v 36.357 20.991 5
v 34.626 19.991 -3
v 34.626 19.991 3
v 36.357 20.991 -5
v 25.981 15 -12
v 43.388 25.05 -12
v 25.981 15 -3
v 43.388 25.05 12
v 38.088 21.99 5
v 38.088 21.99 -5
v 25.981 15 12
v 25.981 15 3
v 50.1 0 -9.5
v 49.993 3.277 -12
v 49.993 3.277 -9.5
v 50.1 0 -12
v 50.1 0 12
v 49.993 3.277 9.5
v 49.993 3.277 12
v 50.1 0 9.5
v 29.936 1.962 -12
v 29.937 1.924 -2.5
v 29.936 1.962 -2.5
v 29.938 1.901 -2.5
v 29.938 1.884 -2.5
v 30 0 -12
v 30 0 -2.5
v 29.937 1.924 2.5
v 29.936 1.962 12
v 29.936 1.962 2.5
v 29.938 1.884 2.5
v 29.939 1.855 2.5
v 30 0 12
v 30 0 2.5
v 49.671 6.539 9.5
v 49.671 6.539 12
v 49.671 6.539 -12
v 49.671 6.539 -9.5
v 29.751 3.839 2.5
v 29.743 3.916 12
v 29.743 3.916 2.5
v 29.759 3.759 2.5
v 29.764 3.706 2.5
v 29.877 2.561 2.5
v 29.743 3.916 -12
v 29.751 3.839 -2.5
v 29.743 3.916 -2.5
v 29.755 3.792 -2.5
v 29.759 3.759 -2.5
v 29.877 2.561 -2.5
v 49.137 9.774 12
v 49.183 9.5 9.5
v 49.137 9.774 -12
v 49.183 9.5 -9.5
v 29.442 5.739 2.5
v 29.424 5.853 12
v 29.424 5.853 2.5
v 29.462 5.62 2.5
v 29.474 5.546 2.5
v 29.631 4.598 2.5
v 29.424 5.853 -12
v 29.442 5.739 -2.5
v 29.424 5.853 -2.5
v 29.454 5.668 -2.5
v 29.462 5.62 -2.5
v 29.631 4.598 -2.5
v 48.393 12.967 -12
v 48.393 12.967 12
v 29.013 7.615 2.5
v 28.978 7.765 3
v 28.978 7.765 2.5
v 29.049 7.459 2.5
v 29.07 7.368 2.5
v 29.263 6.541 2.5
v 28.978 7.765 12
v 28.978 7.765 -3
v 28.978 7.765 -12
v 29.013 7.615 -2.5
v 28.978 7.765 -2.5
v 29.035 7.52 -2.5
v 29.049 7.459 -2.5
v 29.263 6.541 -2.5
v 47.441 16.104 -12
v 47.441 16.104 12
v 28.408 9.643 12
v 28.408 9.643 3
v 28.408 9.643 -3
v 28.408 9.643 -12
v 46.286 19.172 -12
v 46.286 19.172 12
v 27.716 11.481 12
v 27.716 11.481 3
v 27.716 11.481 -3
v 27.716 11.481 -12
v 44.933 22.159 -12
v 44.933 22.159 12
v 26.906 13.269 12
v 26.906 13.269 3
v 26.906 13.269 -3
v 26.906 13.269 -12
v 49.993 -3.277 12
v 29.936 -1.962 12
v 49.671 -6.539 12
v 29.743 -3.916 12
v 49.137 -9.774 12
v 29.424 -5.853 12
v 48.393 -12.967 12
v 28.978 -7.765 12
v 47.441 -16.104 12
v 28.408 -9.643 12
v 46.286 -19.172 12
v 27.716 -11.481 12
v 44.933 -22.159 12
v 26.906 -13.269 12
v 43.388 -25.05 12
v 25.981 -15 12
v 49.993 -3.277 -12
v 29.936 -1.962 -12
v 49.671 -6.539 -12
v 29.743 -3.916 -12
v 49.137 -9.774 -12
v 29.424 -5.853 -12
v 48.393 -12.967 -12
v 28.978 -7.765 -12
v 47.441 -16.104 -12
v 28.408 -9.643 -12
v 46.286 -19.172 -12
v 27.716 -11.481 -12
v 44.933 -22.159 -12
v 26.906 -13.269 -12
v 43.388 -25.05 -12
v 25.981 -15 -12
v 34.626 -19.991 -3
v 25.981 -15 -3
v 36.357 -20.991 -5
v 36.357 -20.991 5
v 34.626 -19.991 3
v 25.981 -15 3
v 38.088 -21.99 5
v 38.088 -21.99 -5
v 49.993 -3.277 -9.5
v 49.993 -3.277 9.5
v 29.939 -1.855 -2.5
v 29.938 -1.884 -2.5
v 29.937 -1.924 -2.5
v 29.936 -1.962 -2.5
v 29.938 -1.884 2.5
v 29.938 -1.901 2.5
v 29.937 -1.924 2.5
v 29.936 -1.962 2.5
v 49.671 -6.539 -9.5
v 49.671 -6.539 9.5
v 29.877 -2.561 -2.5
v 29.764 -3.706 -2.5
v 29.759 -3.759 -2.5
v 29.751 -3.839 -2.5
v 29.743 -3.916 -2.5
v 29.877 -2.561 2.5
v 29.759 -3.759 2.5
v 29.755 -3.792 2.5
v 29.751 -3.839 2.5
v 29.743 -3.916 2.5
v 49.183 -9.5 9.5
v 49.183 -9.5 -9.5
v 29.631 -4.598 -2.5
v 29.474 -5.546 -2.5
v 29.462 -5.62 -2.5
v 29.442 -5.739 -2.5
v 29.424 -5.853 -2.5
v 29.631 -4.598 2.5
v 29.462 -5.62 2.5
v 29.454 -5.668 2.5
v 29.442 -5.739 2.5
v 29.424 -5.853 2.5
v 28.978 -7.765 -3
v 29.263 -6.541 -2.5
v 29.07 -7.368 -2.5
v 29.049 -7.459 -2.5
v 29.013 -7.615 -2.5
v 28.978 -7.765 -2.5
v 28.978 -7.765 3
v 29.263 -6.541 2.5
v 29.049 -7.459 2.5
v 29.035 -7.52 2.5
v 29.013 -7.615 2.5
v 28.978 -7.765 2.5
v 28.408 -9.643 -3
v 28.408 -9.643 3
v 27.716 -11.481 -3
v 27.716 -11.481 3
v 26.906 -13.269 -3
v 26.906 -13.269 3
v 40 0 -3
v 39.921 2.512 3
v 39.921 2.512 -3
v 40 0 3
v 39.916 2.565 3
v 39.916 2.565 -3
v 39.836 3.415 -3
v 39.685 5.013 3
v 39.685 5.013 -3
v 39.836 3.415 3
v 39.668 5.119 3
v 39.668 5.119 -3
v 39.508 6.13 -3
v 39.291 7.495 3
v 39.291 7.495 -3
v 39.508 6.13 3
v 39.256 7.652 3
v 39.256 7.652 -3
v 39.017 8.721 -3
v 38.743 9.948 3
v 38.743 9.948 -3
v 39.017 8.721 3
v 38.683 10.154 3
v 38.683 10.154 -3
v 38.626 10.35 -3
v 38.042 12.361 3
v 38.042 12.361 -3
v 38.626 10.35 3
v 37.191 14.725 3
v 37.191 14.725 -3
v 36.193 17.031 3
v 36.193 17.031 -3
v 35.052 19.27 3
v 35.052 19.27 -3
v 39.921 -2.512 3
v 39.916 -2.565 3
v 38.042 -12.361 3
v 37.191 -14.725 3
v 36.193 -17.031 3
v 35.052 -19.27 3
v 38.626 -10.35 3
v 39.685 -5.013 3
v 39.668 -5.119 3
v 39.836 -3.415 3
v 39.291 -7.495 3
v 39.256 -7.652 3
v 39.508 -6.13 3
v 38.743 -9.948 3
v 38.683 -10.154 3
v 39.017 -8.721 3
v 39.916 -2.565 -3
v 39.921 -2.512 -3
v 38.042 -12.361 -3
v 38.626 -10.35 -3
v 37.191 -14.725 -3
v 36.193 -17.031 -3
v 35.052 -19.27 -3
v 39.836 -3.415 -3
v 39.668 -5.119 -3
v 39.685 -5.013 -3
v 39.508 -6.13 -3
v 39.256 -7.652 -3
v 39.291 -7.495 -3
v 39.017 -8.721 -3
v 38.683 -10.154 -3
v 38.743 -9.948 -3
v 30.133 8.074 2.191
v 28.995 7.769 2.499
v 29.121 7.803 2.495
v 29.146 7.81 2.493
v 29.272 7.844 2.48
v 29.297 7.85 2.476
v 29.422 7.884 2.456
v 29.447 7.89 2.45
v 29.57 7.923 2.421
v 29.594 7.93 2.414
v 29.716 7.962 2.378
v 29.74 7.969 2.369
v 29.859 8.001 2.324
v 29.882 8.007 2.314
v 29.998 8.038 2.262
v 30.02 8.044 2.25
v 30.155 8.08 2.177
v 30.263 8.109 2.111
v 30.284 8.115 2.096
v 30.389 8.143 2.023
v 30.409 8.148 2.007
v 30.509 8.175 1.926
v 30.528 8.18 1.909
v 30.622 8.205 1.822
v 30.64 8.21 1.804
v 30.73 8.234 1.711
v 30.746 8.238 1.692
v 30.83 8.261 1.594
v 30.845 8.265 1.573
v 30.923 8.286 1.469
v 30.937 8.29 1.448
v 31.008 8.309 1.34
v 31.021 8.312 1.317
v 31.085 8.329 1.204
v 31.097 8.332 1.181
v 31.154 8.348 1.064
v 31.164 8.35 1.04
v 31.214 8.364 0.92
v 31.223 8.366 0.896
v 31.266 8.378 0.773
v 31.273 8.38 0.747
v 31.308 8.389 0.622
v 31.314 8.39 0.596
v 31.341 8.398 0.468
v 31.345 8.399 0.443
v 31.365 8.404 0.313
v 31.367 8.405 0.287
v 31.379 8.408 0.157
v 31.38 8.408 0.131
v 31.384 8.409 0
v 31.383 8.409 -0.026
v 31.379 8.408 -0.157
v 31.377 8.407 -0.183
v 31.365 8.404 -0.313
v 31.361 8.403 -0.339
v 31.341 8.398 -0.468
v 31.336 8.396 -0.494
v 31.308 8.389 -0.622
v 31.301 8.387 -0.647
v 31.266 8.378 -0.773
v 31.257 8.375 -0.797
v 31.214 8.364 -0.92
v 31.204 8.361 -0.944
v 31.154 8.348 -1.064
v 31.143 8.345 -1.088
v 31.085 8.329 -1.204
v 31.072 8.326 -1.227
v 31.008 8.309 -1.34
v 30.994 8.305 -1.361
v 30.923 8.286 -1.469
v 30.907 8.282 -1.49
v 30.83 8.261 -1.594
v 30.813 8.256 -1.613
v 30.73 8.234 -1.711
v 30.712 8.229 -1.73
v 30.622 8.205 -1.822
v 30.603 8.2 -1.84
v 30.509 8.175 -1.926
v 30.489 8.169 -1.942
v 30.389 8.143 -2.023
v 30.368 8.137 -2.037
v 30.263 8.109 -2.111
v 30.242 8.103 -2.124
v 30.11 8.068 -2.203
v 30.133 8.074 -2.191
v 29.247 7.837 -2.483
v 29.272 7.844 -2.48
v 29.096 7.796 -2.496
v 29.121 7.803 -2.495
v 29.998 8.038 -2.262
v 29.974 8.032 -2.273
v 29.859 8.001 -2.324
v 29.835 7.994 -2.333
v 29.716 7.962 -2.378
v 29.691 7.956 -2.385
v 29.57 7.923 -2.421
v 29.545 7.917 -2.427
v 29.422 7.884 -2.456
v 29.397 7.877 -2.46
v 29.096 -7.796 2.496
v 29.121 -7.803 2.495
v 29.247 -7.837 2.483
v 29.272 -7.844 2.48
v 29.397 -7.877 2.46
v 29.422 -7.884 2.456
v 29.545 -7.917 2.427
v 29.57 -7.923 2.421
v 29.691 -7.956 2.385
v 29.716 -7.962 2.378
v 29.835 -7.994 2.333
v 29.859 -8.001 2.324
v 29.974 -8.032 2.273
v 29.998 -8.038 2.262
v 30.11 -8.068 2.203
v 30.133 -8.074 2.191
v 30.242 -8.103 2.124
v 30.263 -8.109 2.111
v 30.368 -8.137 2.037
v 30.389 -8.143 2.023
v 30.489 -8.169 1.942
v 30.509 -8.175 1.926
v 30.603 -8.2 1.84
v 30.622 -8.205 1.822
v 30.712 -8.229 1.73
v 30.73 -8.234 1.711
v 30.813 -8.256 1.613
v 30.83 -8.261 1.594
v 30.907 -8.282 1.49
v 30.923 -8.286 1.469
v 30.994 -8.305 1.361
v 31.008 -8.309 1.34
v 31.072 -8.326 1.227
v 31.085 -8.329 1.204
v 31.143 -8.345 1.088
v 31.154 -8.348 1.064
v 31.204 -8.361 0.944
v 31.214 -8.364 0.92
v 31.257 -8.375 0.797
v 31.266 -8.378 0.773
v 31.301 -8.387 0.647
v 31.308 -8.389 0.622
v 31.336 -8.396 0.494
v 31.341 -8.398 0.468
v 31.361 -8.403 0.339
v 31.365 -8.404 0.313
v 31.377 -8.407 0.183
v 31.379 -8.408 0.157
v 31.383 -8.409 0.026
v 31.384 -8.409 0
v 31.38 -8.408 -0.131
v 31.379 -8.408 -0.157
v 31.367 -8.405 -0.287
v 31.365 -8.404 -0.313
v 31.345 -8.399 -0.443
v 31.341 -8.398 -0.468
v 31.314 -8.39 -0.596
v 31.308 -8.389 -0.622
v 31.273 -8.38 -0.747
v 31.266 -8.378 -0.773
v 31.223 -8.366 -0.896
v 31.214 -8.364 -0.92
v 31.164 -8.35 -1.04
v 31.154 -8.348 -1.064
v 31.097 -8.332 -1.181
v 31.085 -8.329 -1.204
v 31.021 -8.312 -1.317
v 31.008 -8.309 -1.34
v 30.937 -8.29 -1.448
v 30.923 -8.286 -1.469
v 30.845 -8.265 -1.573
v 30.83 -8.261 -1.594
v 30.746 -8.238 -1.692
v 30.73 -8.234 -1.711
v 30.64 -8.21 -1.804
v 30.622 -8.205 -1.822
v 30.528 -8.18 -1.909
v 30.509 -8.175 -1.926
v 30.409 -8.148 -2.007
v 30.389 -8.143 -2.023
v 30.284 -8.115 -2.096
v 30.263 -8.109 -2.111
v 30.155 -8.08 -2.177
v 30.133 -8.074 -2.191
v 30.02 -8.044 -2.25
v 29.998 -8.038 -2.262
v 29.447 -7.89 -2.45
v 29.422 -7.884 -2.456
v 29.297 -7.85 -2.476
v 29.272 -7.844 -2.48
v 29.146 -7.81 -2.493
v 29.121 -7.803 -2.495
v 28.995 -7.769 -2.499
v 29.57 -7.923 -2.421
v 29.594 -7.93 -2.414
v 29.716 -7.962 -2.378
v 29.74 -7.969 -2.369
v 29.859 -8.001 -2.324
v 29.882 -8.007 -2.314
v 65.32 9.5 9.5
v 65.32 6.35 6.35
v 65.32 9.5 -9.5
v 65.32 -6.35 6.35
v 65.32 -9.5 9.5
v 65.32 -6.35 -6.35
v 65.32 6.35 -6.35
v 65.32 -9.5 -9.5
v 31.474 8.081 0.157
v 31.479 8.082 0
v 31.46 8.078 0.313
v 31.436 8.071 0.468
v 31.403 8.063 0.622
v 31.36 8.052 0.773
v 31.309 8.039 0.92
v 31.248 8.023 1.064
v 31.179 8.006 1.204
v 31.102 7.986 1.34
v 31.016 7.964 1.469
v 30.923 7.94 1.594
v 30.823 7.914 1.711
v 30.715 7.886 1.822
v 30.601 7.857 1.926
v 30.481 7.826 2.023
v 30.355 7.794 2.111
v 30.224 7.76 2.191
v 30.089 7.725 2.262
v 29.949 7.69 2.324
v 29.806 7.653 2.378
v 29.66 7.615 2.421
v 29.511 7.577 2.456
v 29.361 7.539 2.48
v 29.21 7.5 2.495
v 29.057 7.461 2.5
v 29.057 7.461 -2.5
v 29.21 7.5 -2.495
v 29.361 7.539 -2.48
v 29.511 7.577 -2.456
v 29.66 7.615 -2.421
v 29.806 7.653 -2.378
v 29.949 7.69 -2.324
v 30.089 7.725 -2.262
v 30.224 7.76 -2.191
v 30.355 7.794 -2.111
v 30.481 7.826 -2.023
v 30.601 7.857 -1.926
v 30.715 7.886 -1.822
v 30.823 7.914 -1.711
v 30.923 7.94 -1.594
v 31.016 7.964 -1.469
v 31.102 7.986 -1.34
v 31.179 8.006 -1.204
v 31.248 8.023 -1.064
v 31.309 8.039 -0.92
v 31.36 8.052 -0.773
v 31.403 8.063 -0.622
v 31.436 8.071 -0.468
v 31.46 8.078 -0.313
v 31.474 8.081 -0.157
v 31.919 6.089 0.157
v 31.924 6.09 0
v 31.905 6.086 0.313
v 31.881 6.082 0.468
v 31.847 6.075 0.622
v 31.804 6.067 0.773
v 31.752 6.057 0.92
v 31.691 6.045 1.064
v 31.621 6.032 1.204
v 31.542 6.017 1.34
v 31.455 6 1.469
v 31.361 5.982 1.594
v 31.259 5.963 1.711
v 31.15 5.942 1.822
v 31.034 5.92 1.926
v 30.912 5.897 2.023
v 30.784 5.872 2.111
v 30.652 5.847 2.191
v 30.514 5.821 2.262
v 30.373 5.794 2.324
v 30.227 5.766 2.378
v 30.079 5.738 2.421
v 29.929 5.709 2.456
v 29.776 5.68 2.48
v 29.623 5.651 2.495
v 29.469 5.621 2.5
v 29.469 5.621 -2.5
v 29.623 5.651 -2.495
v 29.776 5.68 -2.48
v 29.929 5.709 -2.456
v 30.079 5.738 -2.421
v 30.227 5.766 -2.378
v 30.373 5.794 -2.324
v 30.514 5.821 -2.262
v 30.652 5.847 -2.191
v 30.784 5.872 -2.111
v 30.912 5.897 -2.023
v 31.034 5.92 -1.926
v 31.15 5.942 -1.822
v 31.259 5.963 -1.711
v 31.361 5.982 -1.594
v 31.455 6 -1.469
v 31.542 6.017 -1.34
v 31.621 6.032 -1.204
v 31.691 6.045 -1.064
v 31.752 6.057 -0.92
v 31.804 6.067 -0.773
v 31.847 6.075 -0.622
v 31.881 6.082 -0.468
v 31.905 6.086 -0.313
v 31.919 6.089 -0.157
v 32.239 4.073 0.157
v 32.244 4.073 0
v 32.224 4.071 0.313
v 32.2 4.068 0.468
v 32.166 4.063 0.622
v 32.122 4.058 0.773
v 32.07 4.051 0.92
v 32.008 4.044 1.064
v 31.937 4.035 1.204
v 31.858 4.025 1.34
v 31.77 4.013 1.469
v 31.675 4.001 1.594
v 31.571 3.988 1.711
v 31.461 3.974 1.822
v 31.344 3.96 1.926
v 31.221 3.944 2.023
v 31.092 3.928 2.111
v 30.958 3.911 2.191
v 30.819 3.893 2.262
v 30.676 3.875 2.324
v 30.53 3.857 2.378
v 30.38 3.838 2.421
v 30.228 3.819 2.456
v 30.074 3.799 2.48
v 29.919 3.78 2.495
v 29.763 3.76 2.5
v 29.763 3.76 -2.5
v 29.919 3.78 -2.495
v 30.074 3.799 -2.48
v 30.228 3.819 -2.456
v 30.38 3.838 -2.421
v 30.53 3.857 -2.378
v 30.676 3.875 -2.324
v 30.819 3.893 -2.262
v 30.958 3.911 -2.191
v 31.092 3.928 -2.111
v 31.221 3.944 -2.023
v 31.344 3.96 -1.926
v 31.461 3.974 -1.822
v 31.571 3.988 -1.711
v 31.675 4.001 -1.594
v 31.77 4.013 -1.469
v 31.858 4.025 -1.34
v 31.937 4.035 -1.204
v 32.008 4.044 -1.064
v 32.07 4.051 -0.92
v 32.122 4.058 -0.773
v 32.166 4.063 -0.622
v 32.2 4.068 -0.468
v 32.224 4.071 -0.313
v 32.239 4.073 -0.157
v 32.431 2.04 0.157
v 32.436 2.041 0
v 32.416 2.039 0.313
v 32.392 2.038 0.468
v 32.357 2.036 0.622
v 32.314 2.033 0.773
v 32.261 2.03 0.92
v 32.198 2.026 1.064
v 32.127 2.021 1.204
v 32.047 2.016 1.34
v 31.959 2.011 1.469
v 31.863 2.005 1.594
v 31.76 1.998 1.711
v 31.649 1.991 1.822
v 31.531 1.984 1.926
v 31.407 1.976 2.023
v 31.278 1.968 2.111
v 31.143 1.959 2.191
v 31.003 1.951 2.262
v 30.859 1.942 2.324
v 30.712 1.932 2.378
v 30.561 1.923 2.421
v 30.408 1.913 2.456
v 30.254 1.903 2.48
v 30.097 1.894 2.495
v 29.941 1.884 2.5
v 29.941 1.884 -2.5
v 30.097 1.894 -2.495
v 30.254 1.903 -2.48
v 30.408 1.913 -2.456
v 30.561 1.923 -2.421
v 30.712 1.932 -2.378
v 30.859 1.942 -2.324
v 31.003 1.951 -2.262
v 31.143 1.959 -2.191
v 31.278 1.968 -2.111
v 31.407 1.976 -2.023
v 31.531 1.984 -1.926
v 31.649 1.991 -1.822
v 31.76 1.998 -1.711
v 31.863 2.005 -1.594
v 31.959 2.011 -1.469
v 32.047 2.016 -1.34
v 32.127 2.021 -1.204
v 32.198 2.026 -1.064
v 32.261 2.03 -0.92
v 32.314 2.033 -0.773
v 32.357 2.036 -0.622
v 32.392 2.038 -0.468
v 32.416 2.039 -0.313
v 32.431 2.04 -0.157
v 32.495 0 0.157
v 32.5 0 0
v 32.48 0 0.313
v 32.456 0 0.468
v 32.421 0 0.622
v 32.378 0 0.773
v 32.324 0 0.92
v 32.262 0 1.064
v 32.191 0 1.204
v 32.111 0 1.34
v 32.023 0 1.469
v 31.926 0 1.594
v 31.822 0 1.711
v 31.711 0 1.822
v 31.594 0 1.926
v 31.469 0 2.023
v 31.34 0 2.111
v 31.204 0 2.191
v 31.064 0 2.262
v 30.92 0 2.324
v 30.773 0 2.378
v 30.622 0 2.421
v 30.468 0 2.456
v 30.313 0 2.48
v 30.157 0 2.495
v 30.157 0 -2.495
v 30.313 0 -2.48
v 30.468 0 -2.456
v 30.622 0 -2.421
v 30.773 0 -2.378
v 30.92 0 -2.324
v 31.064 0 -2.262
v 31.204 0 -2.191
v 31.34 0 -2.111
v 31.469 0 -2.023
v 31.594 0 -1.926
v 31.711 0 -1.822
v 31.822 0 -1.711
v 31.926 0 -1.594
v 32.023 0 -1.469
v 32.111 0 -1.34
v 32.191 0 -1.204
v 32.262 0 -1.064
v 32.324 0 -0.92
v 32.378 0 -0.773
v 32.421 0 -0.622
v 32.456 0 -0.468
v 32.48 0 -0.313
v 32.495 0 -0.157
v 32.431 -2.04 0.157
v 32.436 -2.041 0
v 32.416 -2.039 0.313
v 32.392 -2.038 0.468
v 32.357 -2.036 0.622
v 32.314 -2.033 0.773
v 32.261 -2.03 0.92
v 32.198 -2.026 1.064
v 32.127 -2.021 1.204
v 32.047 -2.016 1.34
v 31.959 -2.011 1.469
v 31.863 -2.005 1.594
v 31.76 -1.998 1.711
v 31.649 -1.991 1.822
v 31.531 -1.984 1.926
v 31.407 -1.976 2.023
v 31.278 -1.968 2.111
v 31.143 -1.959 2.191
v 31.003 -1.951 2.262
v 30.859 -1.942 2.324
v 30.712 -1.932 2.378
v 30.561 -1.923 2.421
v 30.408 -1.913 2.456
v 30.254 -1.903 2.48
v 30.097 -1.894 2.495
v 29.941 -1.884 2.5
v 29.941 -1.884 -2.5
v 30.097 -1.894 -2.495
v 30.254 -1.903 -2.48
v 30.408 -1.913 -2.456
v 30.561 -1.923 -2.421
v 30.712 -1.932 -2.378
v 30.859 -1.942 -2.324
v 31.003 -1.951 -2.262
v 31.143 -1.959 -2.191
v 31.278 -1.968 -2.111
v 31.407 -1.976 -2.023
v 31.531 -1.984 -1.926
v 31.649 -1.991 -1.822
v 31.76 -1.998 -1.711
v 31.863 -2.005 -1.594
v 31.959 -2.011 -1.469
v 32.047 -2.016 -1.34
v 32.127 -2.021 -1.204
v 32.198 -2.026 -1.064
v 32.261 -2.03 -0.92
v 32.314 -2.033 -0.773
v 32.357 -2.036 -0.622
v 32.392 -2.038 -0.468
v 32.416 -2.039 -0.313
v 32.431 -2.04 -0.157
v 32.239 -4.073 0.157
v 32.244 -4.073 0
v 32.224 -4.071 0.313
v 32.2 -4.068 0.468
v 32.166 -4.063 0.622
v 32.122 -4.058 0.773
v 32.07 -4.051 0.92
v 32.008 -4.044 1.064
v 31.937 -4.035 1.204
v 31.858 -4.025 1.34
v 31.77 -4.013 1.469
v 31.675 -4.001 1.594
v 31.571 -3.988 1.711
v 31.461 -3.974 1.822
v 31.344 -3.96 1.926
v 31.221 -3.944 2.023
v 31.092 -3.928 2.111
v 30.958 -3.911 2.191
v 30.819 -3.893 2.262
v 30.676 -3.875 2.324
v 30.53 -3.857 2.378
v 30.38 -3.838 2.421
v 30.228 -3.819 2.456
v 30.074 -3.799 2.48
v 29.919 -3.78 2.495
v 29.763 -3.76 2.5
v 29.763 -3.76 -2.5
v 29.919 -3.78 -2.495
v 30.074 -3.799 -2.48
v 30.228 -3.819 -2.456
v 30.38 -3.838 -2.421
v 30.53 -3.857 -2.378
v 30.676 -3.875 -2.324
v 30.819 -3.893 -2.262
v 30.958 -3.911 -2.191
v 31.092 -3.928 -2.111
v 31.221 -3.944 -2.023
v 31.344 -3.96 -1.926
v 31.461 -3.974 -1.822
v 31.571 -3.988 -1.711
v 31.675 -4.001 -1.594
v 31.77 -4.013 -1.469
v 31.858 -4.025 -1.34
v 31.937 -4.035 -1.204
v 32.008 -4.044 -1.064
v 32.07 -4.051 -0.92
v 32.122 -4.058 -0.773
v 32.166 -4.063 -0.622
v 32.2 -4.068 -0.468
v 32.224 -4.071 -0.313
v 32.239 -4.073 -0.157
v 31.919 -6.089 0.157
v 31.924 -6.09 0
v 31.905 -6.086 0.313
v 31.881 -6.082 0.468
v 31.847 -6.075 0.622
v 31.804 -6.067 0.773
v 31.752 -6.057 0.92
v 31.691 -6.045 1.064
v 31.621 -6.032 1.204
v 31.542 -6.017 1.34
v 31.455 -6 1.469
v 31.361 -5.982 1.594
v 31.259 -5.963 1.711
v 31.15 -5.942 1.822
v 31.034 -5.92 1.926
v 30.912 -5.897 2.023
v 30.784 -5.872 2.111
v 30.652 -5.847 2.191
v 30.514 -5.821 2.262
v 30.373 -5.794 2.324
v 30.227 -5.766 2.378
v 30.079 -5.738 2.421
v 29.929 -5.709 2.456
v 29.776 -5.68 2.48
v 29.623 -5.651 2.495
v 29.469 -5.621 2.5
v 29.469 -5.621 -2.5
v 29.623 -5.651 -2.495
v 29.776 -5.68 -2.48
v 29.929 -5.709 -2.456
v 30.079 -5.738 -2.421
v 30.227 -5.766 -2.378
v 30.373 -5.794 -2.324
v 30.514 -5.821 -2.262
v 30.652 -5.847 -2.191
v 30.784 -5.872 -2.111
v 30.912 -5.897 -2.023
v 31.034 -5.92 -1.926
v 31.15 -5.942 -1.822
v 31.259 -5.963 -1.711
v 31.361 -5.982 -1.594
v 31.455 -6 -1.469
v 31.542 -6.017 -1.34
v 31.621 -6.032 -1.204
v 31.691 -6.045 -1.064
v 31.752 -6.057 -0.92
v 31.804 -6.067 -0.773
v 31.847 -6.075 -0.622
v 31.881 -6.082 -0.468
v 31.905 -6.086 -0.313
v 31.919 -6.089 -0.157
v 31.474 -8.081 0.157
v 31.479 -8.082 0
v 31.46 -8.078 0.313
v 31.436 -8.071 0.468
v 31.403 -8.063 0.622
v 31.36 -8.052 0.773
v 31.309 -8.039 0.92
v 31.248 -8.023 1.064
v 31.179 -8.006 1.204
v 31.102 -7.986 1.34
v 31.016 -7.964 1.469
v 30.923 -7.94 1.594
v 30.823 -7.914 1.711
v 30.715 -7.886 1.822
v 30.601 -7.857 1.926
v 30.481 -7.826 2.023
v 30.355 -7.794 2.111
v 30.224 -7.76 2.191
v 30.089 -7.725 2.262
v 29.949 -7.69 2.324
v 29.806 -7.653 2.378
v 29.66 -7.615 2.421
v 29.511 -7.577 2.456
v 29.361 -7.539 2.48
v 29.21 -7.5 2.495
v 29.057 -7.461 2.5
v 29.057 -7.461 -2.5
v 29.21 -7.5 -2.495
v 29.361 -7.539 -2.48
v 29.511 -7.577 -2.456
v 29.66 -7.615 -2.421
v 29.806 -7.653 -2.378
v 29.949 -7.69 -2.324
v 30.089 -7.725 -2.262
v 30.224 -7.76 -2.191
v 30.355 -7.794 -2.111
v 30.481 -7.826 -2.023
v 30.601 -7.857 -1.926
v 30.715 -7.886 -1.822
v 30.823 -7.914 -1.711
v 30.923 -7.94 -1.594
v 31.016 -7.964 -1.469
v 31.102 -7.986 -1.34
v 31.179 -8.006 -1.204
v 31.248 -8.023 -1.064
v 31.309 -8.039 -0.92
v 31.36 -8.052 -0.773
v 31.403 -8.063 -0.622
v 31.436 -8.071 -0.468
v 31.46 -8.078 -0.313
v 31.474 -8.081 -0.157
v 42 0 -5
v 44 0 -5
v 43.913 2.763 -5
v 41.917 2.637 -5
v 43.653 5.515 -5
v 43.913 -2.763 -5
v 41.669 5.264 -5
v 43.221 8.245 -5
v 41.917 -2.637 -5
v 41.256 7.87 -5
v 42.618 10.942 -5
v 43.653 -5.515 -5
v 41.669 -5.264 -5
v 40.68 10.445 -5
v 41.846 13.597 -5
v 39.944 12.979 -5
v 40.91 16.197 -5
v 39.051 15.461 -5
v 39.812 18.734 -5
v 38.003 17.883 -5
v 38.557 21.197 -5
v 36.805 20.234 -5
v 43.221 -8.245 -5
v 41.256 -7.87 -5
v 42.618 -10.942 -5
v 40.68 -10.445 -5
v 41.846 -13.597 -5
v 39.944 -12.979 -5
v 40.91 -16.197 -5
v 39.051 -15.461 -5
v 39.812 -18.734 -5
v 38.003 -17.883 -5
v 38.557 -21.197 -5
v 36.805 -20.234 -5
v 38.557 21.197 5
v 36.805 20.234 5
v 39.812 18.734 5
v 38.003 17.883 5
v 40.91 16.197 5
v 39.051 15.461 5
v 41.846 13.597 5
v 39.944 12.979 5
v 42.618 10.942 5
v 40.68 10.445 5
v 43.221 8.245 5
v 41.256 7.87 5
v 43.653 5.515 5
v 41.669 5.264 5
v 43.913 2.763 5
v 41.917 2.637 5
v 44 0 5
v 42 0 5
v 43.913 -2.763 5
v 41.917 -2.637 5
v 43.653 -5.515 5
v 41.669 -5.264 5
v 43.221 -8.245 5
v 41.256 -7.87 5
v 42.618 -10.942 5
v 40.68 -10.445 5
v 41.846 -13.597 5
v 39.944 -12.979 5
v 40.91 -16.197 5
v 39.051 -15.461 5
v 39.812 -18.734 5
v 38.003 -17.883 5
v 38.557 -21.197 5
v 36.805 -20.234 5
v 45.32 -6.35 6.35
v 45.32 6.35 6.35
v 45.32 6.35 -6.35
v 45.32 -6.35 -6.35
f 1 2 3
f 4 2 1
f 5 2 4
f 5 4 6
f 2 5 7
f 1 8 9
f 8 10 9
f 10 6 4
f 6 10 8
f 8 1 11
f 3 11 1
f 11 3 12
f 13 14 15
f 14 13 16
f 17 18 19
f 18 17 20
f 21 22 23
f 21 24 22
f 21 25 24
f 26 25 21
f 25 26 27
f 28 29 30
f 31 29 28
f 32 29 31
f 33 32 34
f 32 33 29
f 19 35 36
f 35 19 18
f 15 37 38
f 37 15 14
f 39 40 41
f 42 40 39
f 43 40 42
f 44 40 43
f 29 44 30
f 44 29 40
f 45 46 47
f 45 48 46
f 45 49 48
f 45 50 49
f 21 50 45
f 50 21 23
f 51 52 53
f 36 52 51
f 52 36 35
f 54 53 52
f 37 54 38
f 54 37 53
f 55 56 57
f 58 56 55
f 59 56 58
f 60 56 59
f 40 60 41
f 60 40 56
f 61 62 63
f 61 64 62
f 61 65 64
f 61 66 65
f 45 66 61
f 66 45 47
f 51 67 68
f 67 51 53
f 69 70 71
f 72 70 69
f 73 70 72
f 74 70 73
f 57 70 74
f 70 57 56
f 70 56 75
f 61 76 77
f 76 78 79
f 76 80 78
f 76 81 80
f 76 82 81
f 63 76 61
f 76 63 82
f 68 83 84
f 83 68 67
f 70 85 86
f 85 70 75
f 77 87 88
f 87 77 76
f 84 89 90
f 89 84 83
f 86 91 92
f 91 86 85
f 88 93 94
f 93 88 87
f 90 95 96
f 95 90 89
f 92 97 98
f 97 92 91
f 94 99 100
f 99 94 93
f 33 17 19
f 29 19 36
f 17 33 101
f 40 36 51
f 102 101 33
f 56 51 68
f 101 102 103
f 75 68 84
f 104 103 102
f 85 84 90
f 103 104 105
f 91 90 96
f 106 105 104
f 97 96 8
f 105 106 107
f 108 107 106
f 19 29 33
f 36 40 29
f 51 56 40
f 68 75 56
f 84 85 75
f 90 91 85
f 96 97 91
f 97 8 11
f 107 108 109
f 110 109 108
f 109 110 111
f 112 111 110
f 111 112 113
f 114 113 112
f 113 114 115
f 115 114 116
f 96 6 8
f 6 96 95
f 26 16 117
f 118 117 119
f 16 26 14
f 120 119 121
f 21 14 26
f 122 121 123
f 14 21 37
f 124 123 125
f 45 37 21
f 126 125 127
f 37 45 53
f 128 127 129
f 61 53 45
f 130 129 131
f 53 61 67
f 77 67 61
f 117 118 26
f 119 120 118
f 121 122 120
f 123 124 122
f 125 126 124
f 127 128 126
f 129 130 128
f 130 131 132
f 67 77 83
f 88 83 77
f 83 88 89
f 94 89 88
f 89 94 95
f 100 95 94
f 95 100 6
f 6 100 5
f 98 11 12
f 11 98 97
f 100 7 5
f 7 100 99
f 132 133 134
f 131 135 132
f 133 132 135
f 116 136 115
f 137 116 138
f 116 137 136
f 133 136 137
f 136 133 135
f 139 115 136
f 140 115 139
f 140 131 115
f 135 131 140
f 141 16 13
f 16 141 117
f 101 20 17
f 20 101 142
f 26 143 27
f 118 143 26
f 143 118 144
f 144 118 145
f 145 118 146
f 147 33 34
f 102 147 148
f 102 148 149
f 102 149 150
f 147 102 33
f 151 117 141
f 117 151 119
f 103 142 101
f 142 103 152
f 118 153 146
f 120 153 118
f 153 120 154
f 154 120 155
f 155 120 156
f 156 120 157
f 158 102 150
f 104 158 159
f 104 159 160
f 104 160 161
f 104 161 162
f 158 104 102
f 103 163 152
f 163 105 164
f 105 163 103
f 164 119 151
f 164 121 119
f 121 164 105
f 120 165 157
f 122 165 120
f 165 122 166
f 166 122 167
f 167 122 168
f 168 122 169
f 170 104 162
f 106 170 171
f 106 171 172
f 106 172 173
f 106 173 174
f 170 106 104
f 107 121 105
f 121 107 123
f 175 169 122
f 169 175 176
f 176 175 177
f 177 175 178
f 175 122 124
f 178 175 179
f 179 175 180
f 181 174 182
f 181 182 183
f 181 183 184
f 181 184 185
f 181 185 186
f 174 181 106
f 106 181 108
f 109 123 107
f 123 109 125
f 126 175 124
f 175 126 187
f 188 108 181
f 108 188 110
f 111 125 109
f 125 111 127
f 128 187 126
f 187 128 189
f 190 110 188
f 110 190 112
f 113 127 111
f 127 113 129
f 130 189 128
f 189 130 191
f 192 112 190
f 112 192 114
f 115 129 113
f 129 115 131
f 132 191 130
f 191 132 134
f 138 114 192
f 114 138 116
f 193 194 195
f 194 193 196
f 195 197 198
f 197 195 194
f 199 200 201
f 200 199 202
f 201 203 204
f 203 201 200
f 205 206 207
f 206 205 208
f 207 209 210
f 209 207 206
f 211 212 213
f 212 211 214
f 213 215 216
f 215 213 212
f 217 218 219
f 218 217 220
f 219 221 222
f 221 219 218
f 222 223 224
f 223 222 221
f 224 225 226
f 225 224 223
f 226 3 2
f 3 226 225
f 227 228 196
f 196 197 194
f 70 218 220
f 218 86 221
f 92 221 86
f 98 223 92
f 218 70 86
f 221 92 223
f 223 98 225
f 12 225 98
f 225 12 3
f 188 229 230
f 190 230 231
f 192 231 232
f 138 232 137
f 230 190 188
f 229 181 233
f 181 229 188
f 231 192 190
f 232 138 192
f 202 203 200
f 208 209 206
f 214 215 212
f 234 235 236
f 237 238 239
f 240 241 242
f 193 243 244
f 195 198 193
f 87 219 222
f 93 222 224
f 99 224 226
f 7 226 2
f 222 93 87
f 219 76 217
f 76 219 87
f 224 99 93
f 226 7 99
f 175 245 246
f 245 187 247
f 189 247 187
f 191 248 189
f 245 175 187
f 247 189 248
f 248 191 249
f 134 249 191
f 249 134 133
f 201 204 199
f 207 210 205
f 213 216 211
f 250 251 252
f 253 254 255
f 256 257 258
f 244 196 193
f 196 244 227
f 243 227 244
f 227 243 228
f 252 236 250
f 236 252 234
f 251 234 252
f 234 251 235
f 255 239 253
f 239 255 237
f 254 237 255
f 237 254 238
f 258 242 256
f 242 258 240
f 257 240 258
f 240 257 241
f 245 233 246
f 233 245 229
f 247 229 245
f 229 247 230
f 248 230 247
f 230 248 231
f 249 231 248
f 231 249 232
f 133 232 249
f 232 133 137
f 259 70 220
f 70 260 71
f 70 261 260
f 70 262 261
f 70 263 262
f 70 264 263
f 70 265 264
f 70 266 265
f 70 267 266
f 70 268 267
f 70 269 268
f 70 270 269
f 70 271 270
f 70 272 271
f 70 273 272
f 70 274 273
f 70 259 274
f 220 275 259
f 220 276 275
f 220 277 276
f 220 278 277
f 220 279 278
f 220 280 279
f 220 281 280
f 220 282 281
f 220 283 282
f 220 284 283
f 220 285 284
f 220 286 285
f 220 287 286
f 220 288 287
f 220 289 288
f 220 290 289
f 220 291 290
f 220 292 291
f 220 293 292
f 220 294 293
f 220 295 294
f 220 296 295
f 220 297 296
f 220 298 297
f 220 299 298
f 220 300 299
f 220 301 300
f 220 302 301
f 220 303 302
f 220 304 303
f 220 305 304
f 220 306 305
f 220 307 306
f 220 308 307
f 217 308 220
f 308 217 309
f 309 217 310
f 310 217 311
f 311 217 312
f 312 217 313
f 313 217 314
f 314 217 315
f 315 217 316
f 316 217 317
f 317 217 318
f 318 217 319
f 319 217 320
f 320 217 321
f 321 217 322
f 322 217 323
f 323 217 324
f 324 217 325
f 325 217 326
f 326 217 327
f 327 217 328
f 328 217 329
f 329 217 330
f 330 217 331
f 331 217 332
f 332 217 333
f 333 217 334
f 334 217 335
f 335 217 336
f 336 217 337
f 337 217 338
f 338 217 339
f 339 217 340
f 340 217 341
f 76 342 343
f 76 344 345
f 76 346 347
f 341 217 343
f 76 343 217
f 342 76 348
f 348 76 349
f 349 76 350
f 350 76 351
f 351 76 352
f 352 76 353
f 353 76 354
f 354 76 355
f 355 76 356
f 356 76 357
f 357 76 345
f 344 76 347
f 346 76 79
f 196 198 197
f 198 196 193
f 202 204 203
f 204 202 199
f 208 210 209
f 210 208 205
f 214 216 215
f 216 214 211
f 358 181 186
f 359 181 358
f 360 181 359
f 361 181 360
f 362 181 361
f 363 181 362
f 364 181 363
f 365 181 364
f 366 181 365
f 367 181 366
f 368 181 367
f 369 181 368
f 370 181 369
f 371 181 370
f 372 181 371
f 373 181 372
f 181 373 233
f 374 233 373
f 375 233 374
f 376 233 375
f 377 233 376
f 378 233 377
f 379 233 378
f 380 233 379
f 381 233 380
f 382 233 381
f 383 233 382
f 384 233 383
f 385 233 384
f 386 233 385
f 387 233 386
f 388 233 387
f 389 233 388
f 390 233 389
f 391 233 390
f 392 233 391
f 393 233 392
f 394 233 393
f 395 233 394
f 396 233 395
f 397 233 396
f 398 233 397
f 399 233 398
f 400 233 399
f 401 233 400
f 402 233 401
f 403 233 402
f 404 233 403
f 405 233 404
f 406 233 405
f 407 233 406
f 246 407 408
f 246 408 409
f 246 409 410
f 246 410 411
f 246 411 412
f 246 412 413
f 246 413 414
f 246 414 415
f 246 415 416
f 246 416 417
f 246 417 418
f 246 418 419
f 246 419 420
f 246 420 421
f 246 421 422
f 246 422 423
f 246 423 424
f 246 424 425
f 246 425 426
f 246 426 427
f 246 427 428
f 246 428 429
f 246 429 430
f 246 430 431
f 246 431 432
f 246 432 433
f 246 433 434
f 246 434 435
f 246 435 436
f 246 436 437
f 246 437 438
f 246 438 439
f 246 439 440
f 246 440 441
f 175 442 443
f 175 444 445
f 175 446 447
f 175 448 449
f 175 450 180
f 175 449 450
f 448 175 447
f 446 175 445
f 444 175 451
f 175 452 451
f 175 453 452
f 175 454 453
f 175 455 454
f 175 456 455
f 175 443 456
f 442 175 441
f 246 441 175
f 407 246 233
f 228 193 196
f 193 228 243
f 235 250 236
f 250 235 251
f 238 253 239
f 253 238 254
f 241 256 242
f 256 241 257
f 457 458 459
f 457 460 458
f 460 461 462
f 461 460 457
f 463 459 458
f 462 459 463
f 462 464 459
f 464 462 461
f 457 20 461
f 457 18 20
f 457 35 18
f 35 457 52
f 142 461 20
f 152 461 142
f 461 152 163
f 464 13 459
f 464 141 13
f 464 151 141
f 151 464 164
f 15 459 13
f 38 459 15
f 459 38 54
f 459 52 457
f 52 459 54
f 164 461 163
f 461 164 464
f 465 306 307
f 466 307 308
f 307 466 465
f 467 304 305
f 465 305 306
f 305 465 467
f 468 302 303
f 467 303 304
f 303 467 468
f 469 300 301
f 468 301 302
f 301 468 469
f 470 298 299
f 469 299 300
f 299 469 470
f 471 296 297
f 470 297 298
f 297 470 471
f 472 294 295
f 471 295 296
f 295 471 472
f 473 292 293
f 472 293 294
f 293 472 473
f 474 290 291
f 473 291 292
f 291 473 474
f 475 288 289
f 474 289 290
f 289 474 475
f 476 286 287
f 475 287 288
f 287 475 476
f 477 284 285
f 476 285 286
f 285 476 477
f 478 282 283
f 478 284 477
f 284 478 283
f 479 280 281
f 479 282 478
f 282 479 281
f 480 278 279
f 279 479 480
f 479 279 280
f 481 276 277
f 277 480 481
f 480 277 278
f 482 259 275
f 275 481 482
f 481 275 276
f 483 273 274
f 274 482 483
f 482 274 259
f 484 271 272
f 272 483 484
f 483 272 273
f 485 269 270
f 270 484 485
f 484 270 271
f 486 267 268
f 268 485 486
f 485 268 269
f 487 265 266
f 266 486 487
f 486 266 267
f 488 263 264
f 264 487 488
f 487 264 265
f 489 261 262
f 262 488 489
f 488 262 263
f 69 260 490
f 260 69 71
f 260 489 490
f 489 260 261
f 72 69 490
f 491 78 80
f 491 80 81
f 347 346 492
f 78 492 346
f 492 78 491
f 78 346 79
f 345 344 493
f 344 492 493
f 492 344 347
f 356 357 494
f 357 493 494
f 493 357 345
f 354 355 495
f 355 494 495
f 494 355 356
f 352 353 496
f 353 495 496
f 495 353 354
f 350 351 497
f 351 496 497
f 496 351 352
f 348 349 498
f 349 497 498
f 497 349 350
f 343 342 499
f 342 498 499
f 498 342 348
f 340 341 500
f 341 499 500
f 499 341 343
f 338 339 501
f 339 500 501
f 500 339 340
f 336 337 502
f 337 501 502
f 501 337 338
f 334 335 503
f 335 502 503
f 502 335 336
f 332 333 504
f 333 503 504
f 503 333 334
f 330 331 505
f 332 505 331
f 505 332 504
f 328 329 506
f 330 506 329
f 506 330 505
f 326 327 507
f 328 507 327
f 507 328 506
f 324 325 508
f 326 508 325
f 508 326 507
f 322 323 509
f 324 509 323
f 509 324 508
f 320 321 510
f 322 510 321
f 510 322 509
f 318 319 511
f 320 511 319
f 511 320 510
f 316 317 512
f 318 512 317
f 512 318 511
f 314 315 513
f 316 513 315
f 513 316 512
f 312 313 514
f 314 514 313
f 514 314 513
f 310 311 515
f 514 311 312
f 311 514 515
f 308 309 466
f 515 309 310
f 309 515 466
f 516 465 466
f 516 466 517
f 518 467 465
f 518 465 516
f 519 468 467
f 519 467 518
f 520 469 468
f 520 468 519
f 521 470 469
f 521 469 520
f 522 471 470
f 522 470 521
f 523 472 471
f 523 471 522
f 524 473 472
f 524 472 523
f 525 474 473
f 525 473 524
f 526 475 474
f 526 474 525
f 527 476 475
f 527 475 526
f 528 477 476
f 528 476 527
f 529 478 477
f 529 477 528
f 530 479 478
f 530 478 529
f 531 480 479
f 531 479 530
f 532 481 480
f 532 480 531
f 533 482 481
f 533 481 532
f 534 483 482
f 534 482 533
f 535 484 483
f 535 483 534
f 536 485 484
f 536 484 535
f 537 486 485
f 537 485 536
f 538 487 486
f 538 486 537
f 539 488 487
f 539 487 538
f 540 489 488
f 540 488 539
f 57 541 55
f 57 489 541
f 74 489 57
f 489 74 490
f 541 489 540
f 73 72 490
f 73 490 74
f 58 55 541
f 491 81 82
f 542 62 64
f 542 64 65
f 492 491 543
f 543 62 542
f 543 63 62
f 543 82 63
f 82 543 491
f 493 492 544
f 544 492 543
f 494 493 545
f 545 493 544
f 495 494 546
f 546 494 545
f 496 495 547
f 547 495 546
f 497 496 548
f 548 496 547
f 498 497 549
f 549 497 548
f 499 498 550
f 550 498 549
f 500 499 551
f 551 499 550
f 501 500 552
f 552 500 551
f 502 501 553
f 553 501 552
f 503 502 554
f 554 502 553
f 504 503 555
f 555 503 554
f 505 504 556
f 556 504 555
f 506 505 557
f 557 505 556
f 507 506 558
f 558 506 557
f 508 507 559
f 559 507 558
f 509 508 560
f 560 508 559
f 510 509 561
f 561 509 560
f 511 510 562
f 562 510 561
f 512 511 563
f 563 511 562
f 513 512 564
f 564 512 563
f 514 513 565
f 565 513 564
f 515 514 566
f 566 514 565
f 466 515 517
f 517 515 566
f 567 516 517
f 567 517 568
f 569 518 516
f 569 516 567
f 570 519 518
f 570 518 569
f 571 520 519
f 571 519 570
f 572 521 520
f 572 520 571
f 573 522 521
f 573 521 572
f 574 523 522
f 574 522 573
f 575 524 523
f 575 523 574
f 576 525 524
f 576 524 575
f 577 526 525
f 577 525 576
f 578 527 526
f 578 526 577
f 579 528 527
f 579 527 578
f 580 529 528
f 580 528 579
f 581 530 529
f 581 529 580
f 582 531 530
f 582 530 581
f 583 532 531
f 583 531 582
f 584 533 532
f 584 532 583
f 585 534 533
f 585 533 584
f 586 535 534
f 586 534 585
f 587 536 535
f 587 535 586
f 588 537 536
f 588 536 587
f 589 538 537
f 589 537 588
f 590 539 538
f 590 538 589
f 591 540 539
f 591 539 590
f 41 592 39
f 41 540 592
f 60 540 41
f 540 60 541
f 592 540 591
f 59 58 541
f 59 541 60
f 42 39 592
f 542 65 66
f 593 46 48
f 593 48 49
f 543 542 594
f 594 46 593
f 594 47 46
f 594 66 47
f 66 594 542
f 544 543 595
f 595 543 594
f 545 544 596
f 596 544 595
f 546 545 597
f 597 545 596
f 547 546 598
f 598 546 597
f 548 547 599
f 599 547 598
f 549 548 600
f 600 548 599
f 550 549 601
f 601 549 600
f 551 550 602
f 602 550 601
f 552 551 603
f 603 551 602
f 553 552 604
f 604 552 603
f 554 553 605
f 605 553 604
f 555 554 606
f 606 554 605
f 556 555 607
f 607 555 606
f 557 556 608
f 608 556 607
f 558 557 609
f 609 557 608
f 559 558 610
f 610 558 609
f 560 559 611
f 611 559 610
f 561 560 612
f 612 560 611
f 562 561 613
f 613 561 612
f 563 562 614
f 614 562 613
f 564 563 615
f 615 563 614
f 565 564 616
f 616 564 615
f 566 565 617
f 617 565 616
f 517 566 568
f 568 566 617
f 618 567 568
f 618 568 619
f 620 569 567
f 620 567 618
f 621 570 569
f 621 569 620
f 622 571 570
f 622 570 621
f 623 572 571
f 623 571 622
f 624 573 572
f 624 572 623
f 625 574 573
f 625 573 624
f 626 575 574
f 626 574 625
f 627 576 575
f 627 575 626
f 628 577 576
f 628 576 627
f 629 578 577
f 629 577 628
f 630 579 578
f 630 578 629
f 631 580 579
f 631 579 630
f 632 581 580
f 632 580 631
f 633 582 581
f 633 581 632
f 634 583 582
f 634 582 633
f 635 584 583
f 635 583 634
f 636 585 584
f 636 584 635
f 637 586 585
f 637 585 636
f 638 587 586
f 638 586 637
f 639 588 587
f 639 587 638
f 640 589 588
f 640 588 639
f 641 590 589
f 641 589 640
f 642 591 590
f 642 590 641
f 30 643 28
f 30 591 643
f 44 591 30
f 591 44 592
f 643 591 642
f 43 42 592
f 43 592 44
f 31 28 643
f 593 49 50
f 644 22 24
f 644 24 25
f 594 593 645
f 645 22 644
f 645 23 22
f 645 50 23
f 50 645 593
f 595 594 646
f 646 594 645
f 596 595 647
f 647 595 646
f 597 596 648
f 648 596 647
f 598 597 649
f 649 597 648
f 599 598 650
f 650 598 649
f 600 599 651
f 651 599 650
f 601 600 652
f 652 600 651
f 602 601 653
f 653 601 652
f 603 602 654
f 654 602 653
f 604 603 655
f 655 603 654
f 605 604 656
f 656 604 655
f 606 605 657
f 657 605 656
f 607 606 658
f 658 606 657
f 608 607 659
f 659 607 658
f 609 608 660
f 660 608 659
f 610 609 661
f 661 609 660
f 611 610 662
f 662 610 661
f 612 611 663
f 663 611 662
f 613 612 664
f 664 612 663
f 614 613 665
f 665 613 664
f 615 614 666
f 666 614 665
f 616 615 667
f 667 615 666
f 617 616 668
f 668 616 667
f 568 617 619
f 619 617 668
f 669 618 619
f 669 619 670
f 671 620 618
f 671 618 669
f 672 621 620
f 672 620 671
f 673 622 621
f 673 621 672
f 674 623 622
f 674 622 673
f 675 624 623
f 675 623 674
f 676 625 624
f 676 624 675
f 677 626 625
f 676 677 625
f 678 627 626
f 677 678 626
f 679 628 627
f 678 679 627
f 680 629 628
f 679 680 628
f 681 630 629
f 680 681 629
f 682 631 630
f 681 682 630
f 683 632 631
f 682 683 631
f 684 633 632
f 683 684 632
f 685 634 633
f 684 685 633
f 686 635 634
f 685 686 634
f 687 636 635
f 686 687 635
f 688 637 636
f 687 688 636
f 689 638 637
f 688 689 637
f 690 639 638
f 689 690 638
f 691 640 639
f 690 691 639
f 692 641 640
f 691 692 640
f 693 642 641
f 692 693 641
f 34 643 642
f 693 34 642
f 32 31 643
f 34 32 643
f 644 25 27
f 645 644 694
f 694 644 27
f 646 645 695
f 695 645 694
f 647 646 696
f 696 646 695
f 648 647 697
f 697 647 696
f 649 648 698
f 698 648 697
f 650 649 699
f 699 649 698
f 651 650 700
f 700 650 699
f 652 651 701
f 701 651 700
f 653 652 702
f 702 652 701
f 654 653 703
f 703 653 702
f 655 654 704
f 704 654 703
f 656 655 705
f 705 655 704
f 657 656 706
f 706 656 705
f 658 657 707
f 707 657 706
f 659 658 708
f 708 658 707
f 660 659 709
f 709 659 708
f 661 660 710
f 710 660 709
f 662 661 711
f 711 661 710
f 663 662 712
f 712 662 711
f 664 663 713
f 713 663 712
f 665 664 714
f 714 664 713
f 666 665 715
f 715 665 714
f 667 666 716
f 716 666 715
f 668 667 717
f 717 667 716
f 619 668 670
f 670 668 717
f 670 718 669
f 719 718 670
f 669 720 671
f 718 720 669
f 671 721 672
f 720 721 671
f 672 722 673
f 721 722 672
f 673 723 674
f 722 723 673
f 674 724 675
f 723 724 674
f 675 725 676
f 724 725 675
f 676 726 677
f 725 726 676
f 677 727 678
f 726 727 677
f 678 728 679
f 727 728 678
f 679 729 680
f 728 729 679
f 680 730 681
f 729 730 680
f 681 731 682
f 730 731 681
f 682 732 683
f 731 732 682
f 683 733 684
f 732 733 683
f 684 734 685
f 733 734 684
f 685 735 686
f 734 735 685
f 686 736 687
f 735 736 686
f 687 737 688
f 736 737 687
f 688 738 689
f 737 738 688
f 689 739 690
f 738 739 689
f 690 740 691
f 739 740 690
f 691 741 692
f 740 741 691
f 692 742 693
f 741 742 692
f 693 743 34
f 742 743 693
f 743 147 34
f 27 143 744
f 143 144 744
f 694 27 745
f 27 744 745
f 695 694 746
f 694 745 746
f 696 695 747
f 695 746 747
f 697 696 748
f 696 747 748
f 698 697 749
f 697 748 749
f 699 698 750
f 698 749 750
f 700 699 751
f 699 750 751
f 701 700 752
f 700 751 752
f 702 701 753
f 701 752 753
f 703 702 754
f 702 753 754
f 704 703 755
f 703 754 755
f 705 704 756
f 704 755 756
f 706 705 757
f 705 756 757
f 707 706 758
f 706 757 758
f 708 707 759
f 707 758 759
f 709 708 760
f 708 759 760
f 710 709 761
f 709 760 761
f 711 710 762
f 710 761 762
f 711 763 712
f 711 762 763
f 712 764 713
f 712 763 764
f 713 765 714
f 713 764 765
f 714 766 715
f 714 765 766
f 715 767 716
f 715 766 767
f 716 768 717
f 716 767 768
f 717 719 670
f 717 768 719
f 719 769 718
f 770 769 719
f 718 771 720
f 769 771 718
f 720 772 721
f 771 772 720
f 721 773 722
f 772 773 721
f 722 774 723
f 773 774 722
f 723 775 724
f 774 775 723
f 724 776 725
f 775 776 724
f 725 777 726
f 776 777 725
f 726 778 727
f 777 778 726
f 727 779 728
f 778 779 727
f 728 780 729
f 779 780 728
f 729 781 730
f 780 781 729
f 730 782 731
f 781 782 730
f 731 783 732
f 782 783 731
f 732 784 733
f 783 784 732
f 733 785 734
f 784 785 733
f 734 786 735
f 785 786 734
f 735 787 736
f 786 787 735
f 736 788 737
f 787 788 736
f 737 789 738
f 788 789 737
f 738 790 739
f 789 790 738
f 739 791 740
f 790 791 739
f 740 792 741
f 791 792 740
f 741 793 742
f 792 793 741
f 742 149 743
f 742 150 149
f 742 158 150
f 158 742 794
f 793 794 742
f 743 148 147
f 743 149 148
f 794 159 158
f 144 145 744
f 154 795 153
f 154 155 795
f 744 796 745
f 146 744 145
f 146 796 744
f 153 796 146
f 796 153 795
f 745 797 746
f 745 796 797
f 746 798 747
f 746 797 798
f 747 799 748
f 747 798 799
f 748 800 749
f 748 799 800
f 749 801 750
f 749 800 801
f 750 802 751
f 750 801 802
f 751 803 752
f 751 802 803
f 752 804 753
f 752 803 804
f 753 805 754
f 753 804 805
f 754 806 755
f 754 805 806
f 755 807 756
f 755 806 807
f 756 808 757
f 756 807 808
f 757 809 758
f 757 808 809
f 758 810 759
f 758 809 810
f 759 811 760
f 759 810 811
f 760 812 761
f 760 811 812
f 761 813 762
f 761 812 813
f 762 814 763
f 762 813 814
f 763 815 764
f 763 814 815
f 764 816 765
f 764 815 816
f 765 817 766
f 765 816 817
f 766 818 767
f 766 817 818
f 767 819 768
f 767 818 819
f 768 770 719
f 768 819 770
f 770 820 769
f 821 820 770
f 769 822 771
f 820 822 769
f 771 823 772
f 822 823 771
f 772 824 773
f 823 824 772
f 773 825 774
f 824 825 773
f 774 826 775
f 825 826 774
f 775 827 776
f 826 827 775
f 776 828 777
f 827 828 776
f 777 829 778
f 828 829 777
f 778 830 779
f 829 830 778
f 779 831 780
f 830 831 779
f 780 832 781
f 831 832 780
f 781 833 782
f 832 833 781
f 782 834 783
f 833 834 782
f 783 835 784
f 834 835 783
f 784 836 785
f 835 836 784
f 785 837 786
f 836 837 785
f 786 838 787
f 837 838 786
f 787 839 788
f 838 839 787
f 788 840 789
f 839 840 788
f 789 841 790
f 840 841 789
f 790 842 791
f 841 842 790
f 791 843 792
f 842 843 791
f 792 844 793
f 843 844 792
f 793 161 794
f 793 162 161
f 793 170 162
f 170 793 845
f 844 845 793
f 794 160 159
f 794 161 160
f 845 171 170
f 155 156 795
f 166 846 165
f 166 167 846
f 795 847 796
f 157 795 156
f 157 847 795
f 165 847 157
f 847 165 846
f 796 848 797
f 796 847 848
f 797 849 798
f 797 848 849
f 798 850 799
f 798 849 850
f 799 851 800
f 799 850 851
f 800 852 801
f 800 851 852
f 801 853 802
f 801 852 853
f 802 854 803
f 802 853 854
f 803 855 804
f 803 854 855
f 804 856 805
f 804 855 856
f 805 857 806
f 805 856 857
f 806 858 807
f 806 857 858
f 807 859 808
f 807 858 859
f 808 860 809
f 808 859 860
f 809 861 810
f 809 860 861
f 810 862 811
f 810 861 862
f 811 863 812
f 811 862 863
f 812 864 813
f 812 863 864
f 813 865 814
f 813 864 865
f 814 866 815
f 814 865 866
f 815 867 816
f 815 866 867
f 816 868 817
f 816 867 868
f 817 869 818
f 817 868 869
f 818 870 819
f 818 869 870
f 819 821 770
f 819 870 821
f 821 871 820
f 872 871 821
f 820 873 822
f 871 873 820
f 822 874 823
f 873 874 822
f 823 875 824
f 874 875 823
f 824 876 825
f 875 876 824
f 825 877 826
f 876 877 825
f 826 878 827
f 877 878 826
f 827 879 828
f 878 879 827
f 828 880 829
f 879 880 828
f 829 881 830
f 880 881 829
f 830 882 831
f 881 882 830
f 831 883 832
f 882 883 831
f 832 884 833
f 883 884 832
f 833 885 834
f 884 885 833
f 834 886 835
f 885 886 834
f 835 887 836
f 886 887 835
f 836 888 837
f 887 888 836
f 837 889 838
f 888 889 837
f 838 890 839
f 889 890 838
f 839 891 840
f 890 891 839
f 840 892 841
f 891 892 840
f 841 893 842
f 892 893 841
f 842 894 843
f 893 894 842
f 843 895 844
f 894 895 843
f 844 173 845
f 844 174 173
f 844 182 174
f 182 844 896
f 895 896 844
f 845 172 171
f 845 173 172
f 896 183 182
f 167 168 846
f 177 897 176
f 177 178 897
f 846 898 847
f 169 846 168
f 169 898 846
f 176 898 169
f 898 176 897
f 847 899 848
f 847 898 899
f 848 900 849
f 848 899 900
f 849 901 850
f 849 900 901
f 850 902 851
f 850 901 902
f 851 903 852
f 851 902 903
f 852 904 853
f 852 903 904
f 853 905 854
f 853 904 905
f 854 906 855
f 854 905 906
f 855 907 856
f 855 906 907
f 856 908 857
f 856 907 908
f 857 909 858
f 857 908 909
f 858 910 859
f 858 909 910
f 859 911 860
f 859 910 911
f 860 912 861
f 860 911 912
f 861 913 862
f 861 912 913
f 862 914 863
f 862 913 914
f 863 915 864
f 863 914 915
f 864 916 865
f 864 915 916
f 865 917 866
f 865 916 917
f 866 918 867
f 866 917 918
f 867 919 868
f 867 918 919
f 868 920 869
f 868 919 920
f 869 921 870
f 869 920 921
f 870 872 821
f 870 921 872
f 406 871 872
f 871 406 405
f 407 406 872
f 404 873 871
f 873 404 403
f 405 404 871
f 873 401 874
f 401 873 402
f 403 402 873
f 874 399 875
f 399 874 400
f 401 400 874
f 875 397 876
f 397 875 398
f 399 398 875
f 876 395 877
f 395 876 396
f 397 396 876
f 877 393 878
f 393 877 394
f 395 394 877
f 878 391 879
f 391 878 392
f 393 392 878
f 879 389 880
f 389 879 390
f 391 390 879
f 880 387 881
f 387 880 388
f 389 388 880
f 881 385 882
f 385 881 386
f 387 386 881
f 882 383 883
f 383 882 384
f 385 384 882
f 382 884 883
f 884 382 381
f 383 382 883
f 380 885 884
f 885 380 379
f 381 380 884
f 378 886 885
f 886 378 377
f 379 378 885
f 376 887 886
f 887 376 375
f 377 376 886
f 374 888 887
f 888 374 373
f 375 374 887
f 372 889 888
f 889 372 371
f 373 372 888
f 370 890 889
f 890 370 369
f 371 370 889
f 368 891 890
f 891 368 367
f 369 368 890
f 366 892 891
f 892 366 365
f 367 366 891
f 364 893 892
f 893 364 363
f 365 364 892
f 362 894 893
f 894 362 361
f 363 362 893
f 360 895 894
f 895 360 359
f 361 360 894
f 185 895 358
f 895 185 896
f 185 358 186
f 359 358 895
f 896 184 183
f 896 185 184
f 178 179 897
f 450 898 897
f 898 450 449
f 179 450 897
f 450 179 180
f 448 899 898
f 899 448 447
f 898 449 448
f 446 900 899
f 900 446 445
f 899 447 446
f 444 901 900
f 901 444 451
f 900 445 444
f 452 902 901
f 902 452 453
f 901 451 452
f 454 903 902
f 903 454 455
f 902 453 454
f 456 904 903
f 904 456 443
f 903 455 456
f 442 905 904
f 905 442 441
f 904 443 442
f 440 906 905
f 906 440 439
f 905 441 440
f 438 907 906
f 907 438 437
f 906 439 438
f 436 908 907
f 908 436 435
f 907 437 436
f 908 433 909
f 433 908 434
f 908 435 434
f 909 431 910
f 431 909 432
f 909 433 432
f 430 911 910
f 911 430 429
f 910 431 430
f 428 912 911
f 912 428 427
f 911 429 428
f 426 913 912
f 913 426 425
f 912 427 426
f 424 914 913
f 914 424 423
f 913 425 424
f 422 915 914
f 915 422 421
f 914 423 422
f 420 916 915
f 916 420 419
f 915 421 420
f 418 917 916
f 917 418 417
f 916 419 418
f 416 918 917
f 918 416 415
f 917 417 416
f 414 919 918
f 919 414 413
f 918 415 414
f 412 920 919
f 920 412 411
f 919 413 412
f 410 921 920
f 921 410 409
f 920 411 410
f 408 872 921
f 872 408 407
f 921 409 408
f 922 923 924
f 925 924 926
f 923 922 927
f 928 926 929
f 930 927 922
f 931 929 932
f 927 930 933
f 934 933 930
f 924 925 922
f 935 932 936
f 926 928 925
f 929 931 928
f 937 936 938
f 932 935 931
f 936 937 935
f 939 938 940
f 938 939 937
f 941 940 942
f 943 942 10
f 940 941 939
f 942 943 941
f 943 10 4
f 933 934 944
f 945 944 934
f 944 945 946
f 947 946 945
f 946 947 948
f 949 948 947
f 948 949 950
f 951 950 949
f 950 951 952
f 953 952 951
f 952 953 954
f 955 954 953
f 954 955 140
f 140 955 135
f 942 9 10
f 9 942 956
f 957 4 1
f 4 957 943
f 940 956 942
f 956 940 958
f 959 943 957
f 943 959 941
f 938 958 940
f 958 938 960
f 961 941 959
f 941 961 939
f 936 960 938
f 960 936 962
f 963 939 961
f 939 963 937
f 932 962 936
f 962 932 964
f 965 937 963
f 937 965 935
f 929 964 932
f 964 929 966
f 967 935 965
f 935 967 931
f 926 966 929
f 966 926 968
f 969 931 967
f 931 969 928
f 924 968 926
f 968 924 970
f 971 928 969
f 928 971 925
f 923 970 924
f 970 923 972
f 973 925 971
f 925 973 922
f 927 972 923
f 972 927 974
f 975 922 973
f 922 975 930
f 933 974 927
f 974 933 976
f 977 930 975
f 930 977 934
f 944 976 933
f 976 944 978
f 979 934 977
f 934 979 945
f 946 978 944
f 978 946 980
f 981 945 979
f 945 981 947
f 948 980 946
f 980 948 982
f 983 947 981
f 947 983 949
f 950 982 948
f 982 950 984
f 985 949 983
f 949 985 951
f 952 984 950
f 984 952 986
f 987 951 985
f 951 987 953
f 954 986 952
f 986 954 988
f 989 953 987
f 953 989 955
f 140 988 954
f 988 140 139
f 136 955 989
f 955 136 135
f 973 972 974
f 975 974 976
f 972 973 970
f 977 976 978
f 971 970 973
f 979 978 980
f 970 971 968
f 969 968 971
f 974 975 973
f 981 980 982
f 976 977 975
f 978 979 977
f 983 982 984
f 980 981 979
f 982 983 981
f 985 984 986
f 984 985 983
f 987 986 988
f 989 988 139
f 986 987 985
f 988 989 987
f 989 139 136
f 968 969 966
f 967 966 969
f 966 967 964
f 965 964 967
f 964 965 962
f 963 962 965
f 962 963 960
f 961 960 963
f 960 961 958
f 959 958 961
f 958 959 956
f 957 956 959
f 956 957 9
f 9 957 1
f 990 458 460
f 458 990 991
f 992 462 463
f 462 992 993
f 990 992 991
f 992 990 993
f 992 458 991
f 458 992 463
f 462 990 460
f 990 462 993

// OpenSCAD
lc_s = 12.7; // loadcell_size
lch_s = 19; // loadcellholder_size
lch_l = 20; // loadcellholder_length
bb_r = 2.5; // ballbearing_radius
b_r = 30; // bearing_radius
c_h = 6; // chip_height
c_l = 10; // chip_length
cv_h = 24; // cover_height
cv_l = 20.1; // cover_length
fn = 100;

module bbring(){
  rotate_extrude(angle = 360, $fn = fn) translate([b_r, 0]) circle(r=bb_r, $fn=fn);
}

// chip = 3D arc
module chip(ang, off) {
  union() {
    rotate_extrude(angle = ang, $fn = fn) translate([b_r-off, -c_h/2.0]) square([c_l+off, c_h]);
    rotate_extrude(angle = -ang, $fn = fn) translate([b_r-off, -c_h/2.0]) square([c_l+off, c_h]);
  }
}

module jubilee(off) {
  rotate_extrude(angle=360, $fn = fn) translate([b_r+off, -5]) square([2, 10]);
}

module loadcell() {
  cube([80, lc_s, lc_s]);
}

module cover() {
  difference() {
    union() {
      difference() {
        union() {
          rotate_extrude(angle = 30, $fn = fn) translate([b_r, -cv_h/2.0]) square([cv_l, cv_h]);
          rotate_extrude(angle = -30, $fn = fn) translate([b_r, -cv_h/2.0]) square([cv_l, cv_h]);
        }
        chip(180, 2);
      }
      chip(15, 0);
    translate([b_r+15.32,-lch_s/2.0,-lch_s/2.0]) cube([lch_l, lch_s, lch_s]);
    }
    bbring();
    jubilee(c_l+2);
    translate([b_r+15.32,-lc_s/2.0,-lc_s/2.0]) loadcell();
  }
}

cover();
